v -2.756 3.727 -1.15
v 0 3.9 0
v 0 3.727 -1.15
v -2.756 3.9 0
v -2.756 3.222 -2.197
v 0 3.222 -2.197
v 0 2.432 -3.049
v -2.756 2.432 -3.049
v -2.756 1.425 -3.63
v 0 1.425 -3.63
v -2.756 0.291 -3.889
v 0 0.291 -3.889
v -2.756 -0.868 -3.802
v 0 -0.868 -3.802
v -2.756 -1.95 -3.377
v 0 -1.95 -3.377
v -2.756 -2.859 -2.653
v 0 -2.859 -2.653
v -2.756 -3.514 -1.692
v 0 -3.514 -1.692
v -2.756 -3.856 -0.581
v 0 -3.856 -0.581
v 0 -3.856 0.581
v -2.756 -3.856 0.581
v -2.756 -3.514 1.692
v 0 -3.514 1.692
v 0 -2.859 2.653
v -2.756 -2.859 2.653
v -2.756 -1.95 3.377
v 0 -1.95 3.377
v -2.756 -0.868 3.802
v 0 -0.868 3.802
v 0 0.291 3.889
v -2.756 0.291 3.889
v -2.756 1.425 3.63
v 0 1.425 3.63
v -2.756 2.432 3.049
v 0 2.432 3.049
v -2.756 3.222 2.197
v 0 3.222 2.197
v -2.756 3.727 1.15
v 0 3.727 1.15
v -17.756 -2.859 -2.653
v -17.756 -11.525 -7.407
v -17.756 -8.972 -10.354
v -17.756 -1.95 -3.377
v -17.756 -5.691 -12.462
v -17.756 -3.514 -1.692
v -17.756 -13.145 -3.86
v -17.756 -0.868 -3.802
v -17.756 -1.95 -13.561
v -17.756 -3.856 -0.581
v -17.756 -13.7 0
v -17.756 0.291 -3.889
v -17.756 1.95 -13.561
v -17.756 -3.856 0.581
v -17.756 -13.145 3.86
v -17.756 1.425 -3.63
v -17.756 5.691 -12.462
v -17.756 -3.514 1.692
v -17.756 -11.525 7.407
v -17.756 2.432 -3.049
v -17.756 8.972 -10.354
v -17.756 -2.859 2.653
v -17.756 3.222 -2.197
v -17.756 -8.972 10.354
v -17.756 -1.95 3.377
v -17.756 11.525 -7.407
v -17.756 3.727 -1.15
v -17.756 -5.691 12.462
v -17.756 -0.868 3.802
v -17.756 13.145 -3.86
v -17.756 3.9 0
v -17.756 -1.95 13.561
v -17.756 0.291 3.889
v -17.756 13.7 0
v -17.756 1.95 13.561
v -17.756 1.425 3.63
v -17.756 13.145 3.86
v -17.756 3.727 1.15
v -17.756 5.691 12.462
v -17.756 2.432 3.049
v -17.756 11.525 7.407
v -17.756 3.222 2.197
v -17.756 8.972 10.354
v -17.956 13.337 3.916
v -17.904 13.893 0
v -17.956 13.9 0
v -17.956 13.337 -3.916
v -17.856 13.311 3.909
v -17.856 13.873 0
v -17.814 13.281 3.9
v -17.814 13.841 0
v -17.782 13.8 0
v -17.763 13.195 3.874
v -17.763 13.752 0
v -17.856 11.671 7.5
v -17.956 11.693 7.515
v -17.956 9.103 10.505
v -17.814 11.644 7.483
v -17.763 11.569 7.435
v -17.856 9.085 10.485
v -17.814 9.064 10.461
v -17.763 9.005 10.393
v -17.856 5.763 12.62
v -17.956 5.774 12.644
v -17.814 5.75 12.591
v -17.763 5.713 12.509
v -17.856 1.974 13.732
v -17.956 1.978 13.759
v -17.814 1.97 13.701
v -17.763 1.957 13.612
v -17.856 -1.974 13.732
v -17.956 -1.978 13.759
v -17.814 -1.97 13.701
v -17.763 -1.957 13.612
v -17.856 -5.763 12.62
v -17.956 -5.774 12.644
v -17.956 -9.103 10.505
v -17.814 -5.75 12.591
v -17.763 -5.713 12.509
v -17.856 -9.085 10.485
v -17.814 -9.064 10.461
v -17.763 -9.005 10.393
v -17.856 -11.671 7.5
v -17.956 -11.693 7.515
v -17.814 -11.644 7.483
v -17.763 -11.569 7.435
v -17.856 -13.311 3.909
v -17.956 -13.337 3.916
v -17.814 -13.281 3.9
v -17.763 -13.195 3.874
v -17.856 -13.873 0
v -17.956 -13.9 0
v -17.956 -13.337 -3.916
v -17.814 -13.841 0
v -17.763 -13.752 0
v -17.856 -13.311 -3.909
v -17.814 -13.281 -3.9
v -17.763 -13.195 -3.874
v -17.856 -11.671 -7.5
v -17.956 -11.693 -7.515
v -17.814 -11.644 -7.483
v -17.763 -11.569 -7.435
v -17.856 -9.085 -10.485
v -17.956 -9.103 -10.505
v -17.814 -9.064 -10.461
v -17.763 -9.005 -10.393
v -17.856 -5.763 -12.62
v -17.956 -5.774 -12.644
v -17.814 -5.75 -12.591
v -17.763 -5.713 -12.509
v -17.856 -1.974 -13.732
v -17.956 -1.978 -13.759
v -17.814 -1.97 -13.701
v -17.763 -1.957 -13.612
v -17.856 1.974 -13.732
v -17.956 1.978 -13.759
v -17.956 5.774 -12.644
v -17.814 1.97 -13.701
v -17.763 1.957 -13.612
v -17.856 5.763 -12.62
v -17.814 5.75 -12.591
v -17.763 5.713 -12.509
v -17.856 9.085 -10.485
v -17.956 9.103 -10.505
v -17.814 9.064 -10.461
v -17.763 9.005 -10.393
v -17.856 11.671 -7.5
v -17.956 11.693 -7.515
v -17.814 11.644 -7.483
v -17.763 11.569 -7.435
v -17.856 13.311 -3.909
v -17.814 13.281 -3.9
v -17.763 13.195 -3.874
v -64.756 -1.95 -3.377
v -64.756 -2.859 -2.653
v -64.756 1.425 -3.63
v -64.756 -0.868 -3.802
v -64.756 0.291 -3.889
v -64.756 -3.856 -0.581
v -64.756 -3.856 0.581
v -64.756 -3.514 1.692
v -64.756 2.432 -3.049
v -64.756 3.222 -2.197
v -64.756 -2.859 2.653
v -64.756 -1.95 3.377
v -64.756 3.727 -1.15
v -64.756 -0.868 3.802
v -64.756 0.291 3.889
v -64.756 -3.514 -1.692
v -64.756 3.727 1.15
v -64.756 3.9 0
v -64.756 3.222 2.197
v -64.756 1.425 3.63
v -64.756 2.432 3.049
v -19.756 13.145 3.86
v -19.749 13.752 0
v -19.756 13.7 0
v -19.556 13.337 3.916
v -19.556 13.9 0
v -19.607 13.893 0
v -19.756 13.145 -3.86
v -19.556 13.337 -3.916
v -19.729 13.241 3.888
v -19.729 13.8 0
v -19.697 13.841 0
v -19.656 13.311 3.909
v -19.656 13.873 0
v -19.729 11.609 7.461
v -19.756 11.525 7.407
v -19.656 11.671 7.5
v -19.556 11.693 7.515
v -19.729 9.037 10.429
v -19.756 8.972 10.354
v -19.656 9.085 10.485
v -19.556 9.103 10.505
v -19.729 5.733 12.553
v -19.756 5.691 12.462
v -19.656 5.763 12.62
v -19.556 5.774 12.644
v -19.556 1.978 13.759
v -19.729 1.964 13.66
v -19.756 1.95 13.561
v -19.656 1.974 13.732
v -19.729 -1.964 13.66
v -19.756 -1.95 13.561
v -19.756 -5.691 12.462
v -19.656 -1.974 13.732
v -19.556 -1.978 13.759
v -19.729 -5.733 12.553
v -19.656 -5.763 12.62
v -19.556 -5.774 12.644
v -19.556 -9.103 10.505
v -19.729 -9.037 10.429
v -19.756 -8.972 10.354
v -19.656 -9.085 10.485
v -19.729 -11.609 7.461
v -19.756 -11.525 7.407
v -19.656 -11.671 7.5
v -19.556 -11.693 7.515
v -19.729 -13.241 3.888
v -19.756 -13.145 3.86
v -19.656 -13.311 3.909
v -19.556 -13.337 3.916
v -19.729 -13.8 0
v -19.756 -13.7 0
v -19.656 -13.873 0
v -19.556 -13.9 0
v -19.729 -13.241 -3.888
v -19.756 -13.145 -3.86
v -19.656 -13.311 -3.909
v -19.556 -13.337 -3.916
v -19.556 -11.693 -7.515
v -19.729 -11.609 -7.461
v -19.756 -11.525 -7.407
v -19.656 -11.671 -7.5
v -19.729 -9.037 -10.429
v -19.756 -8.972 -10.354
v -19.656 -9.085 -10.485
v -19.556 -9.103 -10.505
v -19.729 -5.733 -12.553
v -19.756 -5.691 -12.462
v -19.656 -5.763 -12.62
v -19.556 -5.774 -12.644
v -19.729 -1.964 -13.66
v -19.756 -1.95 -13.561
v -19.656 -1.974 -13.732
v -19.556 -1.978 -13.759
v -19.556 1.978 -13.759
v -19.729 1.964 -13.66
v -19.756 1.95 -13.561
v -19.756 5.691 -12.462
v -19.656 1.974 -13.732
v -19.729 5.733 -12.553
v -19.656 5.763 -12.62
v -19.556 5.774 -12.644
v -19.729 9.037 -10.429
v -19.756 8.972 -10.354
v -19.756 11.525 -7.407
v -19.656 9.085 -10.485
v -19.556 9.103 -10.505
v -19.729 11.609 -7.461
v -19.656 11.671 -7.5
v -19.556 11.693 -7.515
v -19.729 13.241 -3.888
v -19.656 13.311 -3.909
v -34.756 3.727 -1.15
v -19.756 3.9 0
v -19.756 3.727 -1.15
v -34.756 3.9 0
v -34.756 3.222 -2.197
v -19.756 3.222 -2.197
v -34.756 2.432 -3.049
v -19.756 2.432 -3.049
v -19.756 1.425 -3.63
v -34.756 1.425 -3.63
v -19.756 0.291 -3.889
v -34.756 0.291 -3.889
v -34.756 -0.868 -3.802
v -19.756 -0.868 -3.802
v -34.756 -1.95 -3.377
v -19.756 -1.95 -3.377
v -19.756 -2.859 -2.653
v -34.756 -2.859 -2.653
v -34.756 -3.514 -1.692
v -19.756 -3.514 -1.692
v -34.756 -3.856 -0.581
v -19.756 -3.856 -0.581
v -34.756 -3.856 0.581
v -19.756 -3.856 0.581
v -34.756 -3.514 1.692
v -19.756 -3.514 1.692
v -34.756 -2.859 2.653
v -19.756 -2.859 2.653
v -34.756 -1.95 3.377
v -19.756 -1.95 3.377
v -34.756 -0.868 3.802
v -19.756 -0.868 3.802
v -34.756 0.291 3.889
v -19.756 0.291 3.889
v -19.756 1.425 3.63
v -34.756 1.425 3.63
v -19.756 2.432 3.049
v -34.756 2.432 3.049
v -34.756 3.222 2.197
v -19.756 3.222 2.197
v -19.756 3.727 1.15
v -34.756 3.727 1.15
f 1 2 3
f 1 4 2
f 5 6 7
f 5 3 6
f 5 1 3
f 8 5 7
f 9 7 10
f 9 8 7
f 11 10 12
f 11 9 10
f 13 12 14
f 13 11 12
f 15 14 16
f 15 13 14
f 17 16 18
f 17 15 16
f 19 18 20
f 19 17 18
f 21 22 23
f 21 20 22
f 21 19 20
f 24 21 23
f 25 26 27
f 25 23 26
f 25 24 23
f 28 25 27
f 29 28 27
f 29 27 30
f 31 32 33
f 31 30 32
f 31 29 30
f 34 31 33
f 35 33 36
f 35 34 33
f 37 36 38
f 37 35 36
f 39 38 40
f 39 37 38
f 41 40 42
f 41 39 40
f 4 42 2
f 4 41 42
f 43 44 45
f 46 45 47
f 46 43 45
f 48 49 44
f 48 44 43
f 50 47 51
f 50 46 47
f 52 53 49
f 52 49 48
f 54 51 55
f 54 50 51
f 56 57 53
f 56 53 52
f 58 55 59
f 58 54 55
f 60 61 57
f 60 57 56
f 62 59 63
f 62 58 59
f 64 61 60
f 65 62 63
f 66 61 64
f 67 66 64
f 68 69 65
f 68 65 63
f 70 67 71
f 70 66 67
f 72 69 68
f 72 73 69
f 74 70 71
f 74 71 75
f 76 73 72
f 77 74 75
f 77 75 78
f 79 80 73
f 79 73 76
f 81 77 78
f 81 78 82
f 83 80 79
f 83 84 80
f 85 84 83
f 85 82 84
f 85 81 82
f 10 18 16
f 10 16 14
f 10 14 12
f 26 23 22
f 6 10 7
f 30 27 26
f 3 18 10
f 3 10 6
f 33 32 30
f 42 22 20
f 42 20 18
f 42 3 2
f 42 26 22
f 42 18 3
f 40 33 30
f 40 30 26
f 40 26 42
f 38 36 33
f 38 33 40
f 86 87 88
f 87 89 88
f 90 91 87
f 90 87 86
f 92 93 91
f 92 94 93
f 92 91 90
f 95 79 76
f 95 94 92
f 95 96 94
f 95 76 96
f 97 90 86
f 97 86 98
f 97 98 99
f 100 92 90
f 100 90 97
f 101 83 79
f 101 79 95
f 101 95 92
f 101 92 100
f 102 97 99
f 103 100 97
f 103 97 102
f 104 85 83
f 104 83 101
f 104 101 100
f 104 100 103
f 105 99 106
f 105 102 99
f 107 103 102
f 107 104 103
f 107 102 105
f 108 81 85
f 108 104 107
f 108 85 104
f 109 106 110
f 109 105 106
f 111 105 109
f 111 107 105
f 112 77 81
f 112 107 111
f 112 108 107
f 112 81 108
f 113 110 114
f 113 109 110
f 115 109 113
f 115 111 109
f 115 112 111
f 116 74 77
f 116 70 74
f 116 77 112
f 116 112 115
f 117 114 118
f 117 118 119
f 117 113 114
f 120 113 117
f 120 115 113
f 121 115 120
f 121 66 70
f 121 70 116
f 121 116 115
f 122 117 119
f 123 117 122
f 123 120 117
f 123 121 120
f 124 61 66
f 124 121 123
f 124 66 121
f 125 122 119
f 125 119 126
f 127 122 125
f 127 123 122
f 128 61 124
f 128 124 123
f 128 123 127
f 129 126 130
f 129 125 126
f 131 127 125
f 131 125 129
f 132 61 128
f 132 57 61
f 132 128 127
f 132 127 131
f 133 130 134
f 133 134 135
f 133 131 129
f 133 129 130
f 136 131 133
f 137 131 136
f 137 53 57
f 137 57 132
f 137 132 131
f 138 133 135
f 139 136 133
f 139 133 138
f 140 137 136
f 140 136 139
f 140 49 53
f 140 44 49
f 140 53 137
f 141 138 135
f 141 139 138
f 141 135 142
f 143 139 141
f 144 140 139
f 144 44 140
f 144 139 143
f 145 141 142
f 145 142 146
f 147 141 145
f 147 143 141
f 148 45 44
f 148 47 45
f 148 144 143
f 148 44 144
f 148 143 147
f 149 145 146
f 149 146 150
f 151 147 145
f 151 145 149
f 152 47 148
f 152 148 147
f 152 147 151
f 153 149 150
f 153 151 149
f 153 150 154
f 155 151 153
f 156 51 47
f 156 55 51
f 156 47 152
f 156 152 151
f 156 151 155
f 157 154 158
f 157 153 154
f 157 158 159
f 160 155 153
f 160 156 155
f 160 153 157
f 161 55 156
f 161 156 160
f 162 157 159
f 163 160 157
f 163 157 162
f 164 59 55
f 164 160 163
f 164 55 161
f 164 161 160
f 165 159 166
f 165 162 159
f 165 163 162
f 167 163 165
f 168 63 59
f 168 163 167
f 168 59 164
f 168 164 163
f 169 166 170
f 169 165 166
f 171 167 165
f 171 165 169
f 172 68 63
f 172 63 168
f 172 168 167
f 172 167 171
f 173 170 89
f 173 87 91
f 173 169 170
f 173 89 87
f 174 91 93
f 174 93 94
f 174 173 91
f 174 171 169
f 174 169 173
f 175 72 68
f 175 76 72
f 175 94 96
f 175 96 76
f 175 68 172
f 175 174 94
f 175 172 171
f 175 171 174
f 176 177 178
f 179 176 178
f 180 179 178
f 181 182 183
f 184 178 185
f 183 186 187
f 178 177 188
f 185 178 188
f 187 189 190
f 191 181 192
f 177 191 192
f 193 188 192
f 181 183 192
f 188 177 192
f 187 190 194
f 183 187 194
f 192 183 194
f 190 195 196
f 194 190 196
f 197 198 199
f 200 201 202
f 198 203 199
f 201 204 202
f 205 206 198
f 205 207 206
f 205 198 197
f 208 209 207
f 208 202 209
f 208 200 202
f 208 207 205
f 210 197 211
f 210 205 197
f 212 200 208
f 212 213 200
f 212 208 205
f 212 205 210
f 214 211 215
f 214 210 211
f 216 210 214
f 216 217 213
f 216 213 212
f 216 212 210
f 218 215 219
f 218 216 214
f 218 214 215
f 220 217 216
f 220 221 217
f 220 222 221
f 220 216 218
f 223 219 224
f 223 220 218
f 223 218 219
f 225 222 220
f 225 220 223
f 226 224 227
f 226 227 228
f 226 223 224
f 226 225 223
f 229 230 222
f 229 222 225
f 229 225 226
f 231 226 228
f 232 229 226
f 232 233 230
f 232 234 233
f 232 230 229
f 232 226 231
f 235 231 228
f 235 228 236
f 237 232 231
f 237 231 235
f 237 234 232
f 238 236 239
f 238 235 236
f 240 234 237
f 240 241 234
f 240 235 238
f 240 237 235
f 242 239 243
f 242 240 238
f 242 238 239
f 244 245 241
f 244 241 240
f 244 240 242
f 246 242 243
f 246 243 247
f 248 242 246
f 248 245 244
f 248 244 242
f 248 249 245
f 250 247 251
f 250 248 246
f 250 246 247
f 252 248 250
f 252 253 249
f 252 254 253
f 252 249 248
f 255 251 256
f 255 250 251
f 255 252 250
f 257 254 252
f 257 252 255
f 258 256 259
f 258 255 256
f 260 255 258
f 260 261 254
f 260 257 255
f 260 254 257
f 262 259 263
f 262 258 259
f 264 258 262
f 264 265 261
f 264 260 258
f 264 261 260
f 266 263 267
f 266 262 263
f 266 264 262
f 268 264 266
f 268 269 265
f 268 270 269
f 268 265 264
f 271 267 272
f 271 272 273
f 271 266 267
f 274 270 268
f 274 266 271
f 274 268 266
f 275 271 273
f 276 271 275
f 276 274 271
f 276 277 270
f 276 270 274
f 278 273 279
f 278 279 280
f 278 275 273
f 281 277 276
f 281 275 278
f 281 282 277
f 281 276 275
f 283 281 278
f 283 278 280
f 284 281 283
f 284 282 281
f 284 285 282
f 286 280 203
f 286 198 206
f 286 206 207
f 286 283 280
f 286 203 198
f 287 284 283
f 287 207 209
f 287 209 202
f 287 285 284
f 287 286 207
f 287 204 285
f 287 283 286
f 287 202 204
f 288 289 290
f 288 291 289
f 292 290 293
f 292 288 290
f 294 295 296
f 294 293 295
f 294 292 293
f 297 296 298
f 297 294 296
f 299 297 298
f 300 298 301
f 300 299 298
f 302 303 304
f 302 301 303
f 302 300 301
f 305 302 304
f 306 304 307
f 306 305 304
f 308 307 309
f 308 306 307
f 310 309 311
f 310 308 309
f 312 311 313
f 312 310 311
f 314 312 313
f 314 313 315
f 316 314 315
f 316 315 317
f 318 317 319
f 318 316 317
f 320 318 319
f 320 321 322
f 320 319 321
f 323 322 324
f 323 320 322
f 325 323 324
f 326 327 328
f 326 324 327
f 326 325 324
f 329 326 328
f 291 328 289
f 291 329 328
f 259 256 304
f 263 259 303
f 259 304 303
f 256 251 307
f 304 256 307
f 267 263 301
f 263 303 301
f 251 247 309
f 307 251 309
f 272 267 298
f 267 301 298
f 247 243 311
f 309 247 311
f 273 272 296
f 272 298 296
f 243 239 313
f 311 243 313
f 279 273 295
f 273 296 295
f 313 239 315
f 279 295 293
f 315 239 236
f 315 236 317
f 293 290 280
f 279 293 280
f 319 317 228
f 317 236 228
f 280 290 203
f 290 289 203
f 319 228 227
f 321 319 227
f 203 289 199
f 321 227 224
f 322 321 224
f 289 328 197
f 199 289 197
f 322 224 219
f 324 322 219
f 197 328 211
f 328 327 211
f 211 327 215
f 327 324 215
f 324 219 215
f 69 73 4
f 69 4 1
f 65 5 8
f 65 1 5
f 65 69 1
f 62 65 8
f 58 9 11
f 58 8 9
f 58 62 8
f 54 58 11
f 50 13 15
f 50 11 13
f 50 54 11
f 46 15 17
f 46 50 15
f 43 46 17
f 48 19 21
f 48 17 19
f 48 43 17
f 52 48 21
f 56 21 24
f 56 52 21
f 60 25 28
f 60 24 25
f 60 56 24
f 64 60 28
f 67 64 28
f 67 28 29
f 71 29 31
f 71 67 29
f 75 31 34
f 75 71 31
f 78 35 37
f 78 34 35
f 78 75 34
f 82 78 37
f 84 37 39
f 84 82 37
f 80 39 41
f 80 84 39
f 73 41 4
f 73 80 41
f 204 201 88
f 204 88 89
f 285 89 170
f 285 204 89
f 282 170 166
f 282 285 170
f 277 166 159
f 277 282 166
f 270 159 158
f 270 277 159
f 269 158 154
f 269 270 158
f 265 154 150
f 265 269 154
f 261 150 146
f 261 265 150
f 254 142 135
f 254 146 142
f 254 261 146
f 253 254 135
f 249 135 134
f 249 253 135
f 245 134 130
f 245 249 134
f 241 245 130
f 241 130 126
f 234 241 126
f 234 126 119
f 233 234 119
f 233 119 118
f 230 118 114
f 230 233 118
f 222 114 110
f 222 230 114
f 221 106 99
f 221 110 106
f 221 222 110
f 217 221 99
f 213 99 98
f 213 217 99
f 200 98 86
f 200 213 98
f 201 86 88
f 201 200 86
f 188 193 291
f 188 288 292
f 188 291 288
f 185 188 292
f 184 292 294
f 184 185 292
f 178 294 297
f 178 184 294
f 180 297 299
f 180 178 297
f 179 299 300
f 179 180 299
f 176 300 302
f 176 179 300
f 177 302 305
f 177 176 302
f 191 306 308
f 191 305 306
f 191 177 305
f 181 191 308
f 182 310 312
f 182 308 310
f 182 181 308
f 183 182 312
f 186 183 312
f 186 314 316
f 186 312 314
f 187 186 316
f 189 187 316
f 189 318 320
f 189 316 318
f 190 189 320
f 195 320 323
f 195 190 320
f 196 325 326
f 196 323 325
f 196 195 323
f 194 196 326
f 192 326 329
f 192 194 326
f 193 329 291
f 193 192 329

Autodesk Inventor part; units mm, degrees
ref_plane "YZ Plane" through (0, 0, 0) normal (1, 0, 0) x (0, 1, 0)
ref_plane "XZ Plane" through (0, 0, 0) normal (0, 1, 0) x (-1, 0, 0)
ref_plane "XY Plane" through (0, 0, 0) normal (0, 0, 1) x (1, 0, 0)
sketch "Sketch1" plane through (0, 0, 0) normal (0, 0, 1) x (1, 0, 0)
  line L0 (0, 0) -> (0, 3.9)
  line L1 (0, 3.9) -> (-17.7557, 3.9)
  line L2 (-17.7557, 3.9) -> (-2.7557, 3.9)
  line L3 (-17.7557, 3.9) -> (-17.7557, 13.9)
  line L4 (-17.7557, 13.9) -> (-19.7557, 13.9)
  line L5 (-19.7557, 13.9) -> (-19.7557, 3.9)
  line L6 (-19.7557, 3.9) -> (-34.7557, 3.9)
  line L7 (-34.7557, 3.9) -> (-64.7557, 3.9)
  line L8 (-64.7557, 3.9) -> (-64.7557, 0)
  line L9 (-64.7557, 0) -> (0, 0)
  dimension "d0" = 3.9
  dimension "d1" = 15
  dimension "d2" = 10
  dimension "d3" = 2
  dimension "d4" = 10
  dimension "d5" = 15
  dimension "d6" = 30
revolve "Revolution1" add sketch "Sketch1" angle 360 about axis through (-64.7557, 0, 0) along (1, 0, 0)
fillet "Fillet1" radius 0.2 2 edges at (-19.7557, -13.9, 0) (-17.7557, -13.9, 0)
properties part number "axlie"
